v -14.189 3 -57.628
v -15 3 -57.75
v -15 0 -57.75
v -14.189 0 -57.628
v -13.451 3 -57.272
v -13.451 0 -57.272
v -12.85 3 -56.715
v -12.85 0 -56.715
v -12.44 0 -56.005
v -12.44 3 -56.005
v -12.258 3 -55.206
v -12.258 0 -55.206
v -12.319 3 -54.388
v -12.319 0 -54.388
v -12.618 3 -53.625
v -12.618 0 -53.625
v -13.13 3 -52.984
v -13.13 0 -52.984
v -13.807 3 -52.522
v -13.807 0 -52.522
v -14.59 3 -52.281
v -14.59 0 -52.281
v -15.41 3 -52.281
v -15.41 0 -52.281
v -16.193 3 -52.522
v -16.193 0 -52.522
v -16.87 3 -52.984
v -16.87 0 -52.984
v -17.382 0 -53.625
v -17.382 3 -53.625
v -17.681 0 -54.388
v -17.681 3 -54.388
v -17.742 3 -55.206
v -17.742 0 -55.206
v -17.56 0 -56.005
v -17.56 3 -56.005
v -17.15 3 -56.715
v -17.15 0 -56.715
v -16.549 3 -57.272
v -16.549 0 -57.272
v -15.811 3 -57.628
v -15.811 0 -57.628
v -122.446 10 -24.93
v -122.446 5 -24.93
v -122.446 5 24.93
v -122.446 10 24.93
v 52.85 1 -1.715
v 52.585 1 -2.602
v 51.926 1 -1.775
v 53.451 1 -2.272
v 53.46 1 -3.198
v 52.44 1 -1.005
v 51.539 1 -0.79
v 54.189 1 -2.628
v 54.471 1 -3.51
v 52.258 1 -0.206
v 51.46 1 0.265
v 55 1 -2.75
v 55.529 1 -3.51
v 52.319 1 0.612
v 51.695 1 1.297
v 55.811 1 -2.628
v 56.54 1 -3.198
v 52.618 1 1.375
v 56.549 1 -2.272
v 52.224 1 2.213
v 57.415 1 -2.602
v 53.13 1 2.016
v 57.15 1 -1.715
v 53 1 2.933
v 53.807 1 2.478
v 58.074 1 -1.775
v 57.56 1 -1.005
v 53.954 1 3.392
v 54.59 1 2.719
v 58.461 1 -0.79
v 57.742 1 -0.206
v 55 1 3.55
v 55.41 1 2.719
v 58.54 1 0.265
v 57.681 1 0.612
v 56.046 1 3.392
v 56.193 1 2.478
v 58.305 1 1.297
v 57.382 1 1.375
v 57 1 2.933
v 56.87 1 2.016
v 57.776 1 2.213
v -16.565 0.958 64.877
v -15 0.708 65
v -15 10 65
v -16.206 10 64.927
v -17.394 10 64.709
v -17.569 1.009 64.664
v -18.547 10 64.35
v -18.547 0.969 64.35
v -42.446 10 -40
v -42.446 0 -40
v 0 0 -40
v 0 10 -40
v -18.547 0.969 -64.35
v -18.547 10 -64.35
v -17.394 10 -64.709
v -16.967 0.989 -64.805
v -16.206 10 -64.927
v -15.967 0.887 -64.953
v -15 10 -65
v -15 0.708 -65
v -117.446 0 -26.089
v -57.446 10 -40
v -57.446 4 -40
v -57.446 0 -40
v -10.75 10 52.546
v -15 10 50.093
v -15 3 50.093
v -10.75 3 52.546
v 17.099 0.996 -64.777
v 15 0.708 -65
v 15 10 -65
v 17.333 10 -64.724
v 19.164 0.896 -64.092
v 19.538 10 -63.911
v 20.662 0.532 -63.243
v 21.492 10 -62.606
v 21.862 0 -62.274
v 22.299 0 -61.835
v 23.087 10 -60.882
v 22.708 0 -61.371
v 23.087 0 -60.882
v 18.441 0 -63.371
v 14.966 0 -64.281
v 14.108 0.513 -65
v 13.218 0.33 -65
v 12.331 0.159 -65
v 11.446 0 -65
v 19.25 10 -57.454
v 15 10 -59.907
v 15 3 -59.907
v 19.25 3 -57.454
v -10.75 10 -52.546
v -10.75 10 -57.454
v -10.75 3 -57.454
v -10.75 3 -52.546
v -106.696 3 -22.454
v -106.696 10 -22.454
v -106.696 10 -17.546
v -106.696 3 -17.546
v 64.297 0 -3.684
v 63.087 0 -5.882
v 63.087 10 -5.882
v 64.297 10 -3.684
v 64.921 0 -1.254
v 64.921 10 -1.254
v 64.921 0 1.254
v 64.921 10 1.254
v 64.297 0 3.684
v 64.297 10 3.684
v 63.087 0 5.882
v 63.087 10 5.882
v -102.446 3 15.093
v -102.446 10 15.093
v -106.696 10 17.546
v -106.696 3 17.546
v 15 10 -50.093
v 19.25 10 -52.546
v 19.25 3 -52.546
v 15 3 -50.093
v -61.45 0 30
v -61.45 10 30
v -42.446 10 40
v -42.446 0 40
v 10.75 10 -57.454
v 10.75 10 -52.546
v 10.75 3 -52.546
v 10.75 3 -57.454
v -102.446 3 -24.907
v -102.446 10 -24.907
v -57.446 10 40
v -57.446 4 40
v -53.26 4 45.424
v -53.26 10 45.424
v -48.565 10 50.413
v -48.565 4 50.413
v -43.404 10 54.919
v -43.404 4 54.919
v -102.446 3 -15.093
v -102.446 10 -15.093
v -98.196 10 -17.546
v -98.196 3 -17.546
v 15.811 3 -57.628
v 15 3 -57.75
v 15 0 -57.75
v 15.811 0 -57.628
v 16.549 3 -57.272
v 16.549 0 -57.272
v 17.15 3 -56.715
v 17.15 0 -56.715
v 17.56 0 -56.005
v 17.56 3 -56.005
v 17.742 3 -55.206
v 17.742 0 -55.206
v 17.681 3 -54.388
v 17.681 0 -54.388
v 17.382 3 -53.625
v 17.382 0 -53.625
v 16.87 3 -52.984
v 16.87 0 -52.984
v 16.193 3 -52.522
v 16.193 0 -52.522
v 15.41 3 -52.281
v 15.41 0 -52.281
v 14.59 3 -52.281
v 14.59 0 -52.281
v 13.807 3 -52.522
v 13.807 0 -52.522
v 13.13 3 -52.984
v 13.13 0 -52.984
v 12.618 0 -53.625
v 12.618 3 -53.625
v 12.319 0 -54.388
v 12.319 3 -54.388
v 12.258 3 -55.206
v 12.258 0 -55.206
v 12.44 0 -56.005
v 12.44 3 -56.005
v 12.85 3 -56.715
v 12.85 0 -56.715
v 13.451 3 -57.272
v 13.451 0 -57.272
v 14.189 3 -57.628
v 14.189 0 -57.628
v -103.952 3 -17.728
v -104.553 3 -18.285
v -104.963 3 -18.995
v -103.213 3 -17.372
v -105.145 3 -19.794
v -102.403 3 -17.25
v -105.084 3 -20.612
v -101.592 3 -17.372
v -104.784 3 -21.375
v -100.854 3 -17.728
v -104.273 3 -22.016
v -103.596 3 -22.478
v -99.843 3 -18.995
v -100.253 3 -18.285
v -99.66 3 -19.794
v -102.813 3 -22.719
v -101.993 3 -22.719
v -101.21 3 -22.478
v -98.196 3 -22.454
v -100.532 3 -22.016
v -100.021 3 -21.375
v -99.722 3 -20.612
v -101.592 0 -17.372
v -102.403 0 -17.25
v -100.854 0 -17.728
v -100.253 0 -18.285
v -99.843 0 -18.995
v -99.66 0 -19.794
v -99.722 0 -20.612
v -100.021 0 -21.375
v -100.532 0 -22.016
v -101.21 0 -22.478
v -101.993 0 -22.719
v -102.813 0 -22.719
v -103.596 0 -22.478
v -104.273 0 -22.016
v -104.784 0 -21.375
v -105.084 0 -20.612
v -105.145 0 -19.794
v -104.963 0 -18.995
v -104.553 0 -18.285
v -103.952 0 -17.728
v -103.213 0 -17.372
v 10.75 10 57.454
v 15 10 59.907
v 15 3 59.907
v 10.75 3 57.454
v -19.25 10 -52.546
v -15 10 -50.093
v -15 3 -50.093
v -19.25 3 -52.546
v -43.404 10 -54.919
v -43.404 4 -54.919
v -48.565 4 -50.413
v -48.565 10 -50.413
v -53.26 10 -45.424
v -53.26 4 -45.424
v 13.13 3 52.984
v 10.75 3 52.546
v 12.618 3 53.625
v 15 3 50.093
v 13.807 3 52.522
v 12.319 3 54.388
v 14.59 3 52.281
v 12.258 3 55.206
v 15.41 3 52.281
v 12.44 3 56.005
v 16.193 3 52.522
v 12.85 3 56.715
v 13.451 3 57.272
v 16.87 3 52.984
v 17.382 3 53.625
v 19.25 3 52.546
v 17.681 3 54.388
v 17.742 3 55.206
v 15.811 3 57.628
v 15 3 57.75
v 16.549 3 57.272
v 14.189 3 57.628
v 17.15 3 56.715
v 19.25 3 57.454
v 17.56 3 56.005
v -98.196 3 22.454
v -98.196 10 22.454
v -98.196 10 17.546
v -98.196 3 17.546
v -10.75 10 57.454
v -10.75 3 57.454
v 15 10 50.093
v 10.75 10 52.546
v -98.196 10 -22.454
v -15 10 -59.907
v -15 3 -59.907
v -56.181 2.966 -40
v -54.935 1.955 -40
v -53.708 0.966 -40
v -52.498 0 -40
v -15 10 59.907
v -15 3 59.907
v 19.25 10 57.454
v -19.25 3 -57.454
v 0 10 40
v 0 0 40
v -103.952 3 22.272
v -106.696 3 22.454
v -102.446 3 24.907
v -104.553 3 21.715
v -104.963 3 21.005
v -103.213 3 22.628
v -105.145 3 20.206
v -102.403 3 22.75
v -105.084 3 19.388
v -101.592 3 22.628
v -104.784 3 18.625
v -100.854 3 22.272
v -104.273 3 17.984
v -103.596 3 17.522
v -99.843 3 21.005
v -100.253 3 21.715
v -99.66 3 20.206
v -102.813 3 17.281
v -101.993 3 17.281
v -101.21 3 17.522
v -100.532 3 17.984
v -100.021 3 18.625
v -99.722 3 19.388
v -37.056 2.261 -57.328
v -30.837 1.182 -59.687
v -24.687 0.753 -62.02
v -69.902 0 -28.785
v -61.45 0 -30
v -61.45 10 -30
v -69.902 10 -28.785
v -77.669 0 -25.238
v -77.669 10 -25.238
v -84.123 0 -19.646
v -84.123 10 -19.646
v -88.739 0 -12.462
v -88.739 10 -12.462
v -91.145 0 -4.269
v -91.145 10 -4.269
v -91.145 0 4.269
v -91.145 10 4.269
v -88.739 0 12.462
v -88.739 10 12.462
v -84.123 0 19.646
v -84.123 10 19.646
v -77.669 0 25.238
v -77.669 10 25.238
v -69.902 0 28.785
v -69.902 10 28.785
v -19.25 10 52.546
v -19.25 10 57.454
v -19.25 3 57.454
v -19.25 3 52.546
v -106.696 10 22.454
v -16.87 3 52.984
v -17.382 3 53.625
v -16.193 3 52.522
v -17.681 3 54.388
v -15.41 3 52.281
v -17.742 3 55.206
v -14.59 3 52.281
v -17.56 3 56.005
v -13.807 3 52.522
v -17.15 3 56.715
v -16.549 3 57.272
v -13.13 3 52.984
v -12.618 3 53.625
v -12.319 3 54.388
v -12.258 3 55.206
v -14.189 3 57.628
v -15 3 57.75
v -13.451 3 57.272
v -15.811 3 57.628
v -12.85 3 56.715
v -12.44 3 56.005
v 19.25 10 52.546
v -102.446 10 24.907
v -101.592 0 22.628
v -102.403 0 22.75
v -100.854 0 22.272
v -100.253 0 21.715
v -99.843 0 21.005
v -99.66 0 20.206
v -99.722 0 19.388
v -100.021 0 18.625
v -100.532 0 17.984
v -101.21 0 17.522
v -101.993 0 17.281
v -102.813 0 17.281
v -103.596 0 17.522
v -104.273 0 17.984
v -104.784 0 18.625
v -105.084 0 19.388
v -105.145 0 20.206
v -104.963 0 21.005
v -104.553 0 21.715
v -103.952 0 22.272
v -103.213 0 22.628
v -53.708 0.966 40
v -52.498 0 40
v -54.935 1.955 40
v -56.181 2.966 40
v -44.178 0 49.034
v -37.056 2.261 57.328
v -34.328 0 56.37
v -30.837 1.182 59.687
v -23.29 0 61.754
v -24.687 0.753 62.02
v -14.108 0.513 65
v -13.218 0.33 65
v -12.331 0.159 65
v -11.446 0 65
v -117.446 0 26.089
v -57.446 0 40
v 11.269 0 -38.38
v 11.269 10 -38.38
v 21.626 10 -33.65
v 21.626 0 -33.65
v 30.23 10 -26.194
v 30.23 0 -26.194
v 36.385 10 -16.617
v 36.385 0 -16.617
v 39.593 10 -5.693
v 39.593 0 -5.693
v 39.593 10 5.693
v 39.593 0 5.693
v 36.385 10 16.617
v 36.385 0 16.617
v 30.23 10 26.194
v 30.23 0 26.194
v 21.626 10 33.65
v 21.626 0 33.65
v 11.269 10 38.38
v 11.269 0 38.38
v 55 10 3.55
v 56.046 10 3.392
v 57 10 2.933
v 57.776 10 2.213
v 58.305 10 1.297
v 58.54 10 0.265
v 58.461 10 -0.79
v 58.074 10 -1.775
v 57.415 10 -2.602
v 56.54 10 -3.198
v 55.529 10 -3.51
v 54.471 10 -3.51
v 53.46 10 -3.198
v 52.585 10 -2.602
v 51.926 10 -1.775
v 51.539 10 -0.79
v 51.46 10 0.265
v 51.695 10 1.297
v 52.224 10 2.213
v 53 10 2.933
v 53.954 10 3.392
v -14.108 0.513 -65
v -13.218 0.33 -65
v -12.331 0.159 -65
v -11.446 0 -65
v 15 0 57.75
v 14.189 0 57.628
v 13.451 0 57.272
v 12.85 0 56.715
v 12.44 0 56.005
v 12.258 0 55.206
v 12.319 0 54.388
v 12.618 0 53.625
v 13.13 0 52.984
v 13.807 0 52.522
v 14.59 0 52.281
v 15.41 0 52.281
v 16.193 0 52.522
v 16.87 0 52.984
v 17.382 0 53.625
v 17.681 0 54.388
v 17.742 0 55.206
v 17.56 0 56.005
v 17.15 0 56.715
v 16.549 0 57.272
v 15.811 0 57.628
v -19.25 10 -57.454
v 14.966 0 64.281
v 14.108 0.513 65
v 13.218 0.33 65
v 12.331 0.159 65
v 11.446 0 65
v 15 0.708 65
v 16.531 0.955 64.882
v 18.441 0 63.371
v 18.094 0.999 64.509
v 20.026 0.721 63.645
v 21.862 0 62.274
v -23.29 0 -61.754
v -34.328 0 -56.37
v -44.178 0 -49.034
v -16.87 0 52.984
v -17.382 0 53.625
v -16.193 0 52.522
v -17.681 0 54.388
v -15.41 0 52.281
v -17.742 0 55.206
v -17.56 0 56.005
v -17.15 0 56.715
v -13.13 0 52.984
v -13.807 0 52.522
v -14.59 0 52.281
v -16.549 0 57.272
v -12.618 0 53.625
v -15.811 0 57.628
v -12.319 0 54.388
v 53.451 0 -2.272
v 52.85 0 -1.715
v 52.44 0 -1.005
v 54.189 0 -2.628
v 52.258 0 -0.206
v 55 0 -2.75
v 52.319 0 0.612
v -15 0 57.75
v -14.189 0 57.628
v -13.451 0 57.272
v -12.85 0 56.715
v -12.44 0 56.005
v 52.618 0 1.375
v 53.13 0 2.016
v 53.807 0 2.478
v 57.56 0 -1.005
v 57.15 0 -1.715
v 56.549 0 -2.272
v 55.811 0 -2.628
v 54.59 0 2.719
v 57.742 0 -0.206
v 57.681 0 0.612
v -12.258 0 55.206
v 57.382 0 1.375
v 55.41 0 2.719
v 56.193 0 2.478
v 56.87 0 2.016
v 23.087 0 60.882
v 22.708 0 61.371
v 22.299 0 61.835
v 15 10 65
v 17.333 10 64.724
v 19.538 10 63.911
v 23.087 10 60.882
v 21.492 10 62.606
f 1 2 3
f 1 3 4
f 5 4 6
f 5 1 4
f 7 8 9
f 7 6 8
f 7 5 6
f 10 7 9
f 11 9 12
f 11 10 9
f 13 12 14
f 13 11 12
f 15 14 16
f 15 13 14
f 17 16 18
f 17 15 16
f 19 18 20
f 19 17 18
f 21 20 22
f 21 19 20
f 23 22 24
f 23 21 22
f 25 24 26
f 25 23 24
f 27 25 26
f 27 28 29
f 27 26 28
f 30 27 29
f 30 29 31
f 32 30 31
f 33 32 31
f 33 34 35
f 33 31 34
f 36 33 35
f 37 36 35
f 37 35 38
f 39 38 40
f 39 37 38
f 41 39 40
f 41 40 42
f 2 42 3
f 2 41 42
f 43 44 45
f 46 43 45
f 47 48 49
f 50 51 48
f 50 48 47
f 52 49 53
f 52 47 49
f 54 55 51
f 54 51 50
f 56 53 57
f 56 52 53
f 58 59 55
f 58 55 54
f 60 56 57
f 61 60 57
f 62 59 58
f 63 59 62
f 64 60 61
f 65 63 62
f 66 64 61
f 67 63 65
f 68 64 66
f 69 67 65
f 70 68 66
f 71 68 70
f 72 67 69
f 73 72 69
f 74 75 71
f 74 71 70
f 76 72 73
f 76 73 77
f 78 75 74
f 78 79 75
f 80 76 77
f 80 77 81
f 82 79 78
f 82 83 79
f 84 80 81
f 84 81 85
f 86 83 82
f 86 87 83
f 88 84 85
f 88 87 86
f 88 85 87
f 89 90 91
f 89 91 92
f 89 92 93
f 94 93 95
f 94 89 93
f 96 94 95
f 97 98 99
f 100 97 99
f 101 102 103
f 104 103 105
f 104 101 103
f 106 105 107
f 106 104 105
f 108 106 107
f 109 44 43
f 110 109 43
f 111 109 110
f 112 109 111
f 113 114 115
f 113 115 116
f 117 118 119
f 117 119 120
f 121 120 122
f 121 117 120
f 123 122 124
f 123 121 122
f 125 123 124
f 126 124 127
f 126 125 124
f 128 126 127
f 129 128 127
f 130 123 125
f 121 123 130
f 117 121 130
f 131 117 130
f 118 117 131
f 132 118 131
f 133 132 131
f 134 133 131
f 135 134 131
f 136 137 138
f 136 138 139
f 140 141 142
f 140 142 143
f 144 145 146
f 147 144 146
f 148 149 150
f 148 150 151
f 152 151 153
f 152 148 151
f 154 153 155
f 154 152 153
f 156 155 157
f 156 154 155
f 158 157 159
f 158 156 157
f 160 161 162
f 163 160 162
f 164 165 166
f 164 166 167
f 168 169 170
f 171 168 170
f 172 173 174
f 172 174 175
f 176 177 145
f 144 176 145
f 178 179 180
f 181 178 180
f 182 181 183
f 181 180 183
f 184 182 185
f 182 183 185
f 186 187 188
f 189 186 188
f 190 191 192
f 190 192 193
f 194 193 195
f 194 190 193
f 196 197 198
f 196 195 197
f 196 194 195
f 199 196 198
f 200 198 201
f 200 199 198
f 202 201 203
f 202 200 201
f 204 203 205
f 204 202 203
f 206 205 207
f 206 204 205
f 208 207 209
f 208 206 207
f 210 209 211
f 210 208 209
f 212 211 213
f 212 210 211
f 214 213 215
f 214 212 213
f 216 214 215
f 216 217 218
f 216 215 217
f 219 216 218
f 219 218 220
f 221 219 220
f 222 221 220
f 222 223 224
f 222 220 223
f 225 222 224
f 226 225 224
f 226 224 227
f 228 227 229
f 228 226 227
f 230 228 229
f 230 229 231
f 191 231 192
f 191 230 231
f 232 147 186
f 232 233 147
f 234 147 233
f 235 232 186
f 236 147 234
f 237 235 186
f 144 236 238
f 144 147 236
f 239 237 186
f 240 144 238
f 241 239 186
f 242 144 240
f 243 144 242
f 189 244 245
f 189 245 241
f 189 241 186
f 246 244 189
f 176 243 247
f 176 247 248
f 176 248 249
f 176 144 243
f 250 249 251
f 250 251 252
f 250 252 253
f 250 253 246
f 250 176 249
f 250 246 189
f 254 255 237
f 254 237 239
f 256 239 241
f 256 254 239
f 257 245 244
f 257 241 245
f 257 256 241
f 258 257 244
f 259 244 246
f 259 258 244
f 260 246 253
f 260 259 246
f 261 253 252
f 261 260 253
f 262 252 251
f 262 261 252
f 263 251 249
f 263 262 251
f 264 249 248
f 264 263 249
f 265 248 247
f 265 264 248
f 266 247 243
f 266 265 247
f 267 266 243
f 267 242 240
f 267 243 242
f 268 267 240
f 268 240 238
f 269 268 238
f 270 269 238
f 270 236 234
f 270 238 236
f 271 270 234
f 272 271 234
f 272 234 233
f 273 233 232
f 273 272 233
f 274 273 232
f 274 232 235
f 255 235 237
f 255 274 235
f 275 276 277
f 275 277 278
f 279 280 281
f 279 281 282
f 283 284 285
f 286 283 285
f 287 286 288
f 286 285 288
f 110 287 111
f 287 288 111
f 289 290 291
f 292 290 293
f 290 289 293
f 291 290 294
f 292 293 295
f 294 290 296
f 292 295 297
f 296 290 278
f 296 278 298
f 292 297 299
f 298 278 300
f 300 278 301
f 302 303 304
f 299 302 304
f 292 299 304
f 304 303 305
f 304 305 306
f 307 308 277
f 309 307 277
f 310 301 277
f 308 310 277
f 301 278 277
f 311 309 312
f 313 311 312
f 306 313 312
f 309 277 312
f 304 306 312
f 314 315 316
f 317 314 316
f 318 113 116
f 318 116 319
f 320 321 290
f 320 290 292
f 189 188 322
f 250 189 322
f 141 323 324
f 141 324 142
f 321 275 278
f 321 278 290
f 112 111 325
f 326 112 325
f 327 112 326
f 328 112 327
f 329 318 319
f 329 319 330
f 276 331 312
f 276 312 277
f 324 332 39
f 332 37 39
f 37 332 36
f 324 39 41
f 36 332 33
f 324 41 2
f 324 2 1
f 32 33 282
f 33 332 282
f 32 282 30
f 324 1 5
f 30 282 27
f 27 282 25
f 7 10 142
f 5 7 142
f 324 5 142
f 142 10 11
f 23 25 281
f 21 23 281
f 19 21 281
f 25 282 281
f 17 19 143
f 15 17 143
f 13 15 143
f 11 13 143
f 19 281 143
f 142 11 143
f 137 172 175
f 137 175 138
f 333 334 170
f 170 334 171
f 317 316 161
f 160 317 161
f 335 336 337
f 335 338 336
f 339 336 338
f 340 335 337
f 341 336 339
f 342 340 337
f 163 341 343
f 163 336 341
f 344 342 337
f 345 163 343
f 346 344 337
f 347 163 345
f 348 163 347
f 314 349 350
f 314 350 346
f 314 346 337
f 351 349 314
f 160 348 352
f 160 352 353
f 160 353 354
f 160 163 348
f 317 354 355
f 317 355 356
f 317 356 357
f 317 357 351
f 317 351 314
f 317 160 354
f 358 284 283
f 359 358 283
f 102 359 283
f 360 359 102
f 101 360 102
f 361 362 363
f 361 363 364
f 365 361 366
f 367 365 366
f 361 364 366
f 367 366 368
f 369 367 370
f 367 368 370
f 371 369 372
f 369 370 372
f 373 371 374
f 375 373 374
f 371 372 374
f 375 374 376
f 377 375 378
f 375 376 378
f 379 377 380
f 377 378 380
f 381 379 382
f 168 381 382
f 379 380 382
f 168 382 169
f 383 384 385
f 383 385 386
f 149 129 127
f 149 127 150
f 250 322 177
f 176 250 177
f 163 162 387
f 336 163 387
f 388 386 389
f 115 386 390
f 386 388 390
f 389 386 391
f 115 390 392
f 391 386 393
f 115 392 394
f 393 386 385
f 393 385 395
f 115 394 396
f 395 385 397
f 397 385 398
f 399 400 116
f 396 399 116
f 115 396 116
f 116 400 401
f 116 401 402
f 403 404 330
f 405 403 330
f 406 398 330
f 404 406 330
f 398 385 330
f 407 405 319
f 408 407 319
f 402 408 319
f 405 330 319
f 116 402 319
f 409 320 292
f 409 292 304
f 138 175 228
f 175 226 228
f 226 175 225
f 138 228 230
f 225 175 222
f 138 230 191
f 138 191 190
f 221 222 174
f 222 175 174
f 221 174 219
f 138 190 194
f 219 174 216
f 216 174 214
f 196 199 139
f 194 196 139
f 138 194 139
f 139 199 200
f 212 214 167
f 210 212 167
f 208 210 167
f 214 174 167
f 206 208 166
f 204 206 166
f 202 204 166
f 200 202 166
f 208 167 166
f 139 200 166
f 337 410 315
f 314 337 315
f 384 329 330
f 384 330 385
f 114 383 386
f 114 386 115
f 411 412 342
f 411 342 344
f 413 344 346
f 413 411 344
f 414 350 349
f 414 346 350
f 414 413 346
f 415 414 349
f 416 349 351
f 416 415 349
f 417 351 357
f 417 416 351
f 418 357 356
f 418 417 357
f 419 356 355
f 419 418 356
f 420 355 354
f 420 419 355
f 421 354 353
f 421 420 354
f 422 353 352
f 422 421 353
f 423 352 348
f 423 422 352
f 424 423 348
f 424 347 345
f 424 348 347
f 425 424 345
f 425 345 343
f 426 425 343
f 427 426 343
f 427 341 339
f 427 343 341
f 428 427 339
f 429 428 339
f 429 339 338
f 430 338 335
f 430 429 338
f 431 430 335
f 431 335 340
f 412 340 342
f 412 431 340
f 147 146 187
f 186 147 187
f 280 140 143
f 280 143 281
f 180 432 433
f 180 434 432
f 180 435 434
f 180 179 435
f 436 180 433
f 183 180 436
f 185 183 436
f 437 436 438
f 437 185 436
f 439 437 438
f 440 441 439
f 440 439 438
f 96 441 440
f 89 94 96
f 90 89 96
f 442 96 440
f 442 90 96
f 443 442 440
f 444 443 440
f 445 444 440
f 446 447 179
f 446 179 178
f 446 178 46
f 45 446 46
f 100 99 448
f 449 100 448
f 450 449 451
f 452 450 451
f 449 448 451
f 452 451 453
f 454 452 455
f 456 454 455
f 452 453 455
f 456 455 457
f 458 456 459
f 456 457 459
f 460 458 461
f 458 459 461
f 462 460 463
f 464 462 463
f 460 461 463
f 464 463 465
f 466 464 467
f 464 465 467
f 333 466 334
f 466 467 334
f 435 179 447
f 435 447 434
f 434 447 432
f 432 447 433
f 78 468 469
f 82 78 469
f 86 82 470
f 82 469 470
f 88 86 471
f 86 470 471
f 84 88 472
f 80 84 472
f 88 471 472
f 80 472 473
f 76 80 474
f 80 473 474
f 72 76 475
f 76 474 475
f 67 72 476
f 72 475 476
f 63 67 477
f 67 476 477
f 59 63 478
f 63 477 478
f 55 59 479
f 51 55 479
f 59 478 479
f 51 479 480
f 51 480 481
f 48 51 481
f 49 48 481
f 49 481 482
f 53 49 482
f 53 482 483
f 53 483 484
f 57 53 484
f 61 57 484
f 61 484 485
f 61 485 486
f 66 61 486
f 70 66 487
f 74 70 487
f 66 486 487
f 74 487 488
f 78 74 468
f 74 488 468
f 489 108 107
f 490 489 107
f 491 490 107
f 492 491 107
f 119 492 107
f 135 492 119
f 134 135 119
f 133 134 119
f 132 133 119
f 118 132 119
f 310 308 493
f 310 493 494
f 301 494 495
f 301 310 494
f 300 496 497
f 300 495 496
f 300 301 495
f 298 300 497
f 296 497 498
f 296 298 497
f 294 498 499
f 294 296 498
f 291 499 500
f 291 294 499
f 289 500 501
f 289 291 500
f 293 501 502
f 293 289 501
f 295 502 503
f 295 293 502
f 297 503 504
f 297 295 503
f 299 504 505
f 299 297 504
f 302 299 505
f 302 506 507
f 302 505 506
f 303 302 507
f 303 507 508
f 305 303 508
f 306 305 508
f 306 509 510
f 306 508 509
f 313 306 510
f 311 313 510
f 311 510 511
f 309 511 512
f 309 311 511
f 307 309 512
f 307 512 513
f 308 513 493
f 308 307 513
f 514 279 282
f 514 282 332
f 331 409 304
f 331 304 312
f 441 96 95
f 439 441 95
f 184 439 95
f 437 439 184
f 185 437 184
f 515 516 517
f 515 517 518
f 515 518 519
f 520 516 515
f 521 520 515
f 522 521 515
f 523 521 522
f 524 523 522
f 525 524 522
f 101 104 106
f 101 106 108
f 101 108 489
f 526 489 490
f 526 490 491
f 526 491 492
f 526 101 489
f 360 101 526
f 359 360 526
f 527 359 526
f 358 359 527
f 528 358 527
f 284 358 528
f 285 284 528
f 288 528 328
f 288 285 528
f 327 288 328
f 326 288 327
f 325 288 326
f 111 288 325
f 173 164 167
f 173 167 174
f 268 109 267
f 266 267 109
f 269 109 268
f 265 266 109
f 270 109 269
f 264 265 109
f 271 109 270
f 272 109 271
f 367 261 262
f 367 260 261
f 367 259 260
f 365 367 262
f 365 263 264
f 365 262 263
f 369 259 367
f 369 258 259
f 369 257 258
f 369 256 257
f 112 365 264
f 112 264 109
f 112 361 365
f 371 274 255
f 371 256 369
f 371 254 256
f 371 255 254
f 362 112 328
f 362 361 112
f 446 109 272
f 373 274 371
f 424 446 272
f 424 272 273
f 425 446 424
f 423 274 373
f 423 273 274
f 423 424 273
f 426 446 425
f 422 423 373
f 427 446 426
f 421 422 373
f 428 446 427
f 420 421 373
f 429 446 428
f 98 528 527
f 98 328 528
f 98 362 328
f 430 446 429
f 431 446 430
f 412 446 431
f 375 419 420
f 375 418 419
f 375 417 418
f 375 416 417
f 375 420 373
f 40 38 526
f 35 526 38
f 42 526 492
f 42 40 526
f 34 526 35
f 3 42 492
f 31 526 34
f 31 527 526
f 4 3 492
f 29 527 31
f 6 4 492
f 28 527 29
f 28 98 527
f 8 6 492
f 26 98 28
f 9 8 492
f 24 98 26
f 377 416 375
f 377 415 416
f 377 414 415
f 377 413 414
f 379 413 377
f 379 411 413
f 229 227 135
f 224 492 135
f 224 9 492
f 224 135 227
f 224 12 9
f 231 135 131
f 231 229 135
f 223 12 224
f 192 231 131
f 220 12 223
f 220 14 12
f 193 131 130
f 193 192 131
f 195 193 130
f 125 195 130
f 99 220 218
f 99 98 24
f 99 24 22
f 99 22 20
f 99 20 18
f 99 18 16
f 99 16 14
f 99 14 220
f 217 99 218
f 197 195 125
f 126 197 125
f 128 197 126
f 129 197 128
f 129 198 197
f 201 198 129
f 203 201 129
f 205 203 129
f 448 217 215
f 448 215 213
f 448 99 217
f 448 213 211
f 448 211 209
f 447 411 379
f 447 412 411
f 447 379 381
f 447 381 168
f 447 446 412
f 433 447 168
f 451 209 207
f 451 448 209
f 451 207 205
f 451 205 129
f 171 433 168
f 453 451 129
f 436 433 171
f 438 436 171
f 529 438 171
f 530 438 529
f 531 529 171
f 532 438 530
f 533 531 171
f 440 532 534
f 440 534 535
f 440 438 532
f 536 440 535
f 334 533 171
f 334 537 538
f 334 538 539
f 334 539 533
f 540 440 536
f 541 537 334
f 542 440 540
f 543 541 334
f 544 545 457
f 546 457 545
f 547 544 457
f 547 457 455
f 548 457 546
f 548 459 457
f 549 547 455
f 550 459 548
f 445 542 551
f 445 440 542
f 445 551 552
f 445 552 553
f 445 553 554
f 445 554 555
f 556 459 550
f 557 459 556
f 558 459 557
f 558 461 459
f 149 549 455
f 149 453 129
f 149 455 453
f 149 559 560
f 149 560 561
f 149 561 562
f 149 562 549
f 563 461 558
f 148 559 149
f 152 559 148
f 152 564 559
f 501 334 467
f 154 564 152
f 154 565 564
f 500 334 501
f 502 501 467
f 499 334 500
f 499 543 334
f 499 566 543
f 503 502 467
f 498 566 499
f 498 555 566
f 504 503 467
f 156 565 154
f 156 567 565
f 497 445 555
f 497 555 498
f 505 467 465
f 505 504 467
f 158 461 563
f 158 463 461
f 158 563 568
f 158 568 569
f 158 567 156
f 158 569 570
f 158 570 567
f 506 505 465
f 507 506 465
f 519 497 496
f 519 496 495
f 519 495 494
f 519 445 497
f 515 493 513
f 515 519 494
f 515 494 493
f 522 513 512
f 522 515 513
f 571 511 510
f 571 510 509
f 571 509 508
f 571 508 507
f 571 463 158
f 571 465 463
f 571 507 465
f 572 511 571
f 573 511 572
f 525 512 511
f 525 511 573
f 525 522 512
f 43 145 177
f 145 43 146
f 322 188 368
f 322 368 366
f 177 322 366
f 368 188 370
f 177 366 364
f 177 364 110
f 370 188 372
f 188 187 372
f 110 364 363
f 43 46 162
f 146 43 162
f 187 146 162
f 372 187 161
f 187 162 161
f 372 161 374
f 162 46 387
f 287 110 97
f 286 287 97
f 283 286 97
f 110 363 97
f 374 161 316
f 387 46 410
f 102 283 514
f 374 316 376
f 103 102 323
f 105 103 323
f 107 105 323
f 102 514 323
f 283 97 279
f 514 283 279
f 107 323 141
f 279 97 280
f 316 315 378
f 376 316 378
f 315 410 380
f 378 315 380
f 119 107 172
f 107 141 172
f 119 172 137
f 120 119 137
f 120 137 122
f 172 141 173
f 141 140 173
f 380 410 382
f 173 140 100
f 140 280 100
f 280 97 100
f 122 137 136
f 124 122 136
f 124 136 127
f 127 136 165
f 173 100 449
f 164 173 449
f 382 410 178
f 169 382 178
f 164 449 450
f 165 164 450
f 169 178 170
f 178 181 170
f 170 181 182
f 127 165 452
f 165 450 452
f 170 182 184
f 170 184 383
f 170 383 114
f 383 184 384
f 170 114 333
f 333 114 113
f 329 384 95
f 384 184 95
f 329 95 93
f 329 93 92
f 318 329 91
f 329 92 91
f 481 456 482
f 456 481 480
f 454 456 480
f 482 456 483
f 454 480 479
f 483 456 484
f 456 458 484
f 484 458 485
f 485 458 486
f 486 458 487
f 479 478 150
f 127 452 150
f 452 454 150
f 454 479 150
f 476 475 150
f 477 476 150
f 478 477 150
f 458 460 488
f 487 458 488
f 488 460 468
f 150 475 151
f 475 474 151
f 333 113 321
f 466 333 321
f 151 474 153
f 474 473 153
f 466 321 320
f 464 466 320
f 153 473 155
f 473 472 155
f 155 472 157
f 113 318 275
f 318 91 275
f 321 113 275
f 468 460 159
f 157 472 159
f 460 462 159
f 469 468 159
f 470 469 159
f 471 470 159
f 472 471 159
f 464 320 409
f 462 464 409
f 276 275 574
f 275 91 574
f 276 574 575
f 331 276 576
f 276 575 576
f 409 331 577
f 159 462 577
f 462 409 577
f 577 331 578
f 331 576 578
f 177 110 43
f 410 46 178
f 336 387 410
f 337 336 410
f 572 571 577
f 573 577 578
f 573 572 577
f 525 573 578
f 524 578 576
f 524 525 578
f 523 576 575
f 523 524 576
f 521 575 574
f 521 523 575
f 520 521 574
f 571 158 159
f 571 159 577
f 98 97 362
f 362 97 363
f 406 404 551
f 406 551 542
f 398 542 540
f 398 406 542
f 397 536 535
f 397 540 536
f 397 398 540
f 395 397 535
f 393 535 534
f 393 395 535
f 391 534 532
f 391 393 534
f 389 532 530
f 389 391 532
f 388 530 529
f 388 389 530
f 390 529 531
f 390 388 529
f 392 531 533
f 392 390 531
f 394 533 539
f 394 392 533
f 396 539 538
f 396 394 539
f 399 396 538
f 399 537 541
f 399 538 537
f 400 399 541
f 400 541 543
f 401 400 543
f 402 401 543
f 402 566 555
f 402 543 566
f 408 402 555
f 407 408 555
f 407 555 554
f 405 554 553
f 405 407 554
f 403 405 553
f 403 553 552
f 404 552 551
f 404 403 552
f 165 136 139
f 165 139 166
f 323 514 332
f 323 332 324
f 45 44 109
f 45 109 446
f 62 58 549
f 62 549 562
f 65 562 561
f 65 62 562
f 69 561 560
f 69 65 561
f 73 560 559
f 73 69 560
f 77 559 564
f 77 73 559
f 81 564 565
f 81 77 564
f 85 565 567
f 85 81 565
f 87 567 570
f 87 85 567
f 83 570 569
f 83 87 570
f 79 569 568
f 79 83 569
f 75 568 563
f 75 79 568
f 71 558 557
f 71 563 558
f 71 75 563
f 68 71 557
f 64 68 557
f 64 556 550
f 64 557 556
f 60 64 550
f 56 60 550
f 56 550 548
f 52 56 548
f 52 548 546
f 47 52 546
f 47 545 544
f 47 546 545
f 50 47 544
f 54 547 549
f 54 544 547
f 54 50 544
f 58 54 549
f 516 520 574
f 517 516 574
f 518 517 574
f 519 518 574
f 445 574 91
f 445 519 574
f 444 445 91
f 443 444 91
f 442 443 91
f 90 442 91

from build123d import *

# Parameters (mm, degrees)
SKETCH1_R                = 70
BOSS_EXTRUDE1_DEPTH      = 10
CUT_EXTRUDE1_DEPTH       = 100.498743711
CUT_EXTRUDE1_DEPTH_BACK  = 100.498743711
CUT_EXTRUDE2_DEPTH       = 100.498743711
CUT_EXTRUDE2_DEPTH_BACK  = 100.498743711
SKETCH3_R                = 2.75
CUT_EXTRUDE3_START       = -10
CUT_EXTRUDE3_DEPTH       = 7
SKETCH5_W                = 80
SKETCH5_H                = 80
BOSS_EXTRUDE2_DEPTH      = 10
CHAMFER1_SIZE            = 4
CUT_EXTRUDE4_DEPTH       = 7
CUT_EXTRUDE5_DEPTH       = 142.215903639
CUT_EXTRUDE5_DEPTH_BACK  = 142.215903639
SKETCH7_R                = 2.75
CUT_EXTRUDE6_DEPTH       = 142.396362897
CUT_EXTRUDE6_DEPTH_BACK  = 142.396362897
CUT_EXTRUDE7_DEPTH       = 142.396362897
CUT_EXTRUDE7_DEPTH_BACK  = 142.396362897
CHAMFER3_SIZE            = 5
CUT_EXTRUDE8_DEPTH       = 142.396362897
CUT_EXTRUDE8_DEPTH_BACK  = 142.396362897
SKETCH10_R               = 2.75
SKETCH11_R               = 3.55
CUT_EXTRUDE9_DEPTH       = 9
CUT_EXTRUDE11_DEPTH      = 142.396362897
CUT_EXTRUDE11_DEPTH_BACK = 142.396362897
SKETCH12_OUTSIDE_W       = 242.084
SKETCH12_OUTSIDE_H       = 189.638


with BuildPart() as part:
    # Sketch1 → Boss-Extrude1 (new body)
    with BuildSketch(Plane(origin=(0, 0, 0), x_dir=(1, 0, 0), z_dir=(0, 1, 0))):
        with Locations(Location((0, 0, 0), (0, 0, 270))):
            Circle(SKETCH1_R)
    extrude(amount=BOSS_EXTRUDE1_DEPTH)

    # Sketch2 → Cut-Extrude1 (cut, two sides: drawn at the far end of the back side and taken through both)
    with BuildSketch(Plane(origin=(0, 10, 0), x_dir=(1, 0, 0), z_dir=(0, 1, 0)).offset(-CUT_EXTRUDE1_DEPTH_BACK)):
        with BuildLine():
            Line((0, -40), (-130.143973447, -40))
            ThreePointArc((-130.143973447, -40), (-170.143973447, 0), (-130.143973447, 40))
            Line((-130.143973447, 40), (0, 40))
            ThreePointArc((0, 40), (40, 0), (0, -40))
        make_face()
    extrude(amount=CUT_EXTRUDE1_DEPTH + CUT_EXTRUDE1_DEPTH_BACK, mode=Mode.SUBTRACT)

    # Sketch3 → Cut-Extrude2 (cut, two sides: drawn at the far end of the back side and taken through both)
    with BuildSketch(Plane(origin=(0, 0, 0), x_dir=(-1, 0, 0), z_dir=(0, -1, 0)).offset(-CUT_EXTRUDE2_DEPTH_BACK)):
        with Locations(Location((15, 55, 0), (0, 0, 90))):
            Circle(SKETCH3_R)
        with Locations(Location((-15, 55, 0), (0, 0, 90))):
            Circle(SKETCH3_R)
        with Locations(Location((-15, -55, 0), (0, 0, 270))):
            Circle(SKETCH3_R)
        with Locations(Location((15, -55, 0), (0, 0, 270))):
            Circle(SKETCH3_R)
    extrude(amount=CUT_EXTRUDE2_DEPTH + CUT_EXTRUDE2_DEPTH_BACK, mode=Mode.SUBTRACT)

    # Sketch4 → Cut-Extrude3 (cut)
    with BuildSketch(Plane.XZ.offset(CUT_EXTRUDE3_START)):
        Polygon((-15, -50.092522712), (-19.25, -52.546261356), (-19.25, -57.453738644), (-15, -59.907477288), (-10.75, -57.453738644), (-10.75, -52.546261356), align=None)
        Polygon((15, -50.092522712), (10.75, -52.546261356), (10.75, -57.453738644), (15, -59.907477288), (19.25, -57.453738644), (19.25, -52.546261356), align=None)
        Polygon((-15, 59.907477288), (-19.25, 57.453738644), (-19.25, 52.546261356), (-15, 50.092522712), (-10.75, 52.546261356), (-10.75, 57.453738644), align=None)
        Polygon((15, 59.907477288), (10.75, 57.453738644), (10.75, 52.546261356), (15, 50.092522712), (19.25, 52.546261356), (19.25, 57.453738644), align=None)
    extrude(amount=CUT_EXTRUDE3_DEPTH, mode=Mode.SUBTRACT)

    # Sketch5 → Boss-Extrude2 (add)
    with BuildSketch(Plane.XZ):
        with Locations((-82.445626465, 0)):
            Rectangle(SKETCH5_W, SKETCH5_H)
    extrude(amount=-BOSS_EXTRUDE2_DEPTH)

    # Chamfer1
    chamfer1_edges = [part.edges().sort_by_distance(p)[0] for p in [
        (70, 0, 0),
    ]]
    chamfer(chamfer1_edges, length=CHAMFER1_SIZE)

    # Sketch6 → Cut-Extrude4 (cut)
    with BuildSketch(Plane(origin=(0, 10, 0), x_dir=(1, 0, 0), z_dir=(0, 1, 0))):
        Polygon((-102.445626465, 24.907477288), (-106.695626465, 22.453738644), (-106.695626465, 17.546261356), (-102.445626465, 15.092522712), (-98.195626465, 17.546261356), (-98.195626465, 22.453738644), align=None)
        Polygon((-102.445626465, -15.092522712), (-106.695626465, -17.546261356), (-106.695626465, -22.453738644), (-102.445626465, -24.907477288), (-98.195626465, -22.453738644), (-98.195626465, -17.546261356), align=None)
    extrude(amount=-CUT_EXTRUDE4_DEPTH, mode=Mode.SUBTRACT)

    # Sketch7 → Cut-Extrude5 (cut, two sides: drawn at the far end of the back side and taken through both)
    with BuildSketch(Plane(origin=(0, 3, 0), x_dir=(1, 0, 0), z_dir=(0, 1, 0)).offset(-CUT_EXTRUDE5_DEPTH_BACK)):
        with Locations(Location((-102.402760328, 20, 0), (0, 0, 270))):
            Circle(SKETCH7_R)
        with Locations(Location((-102.402760328, -20, 0), (0, 0, 270))):
            Circle(SKETCH7_R)
    extrude(amount=CUT_EXTRUDE5_DEPTH + CUT_EXTRUDE5_DEPTH_BACK, mode=Mode.SUBTRACT)

    # Sketch8 → Cut-Extrude6 (cut, two sides: drawn at the far end of the back side and taken through both)
    with BuildSketch(Plane(origin=(0, 10, 0), x_dir=(1, 0, 0), z_dir=(0, 1, 0)).offset(-CUT_EXTRUDE6_DEPTH_BACK)):
        Polygon((-57.445626465, -40), (-132.928087077, -22.5), (-132.928087077, 22.5), (-57.445626465, 40), (-157.567703317, 66.574038668), (-157.567703317, -80.170037604), align=None)
    extrude(amount=CUT_EXTRUDE6_DEPTH + CUT_EXTRUDE6_DEPTH_BACK, mode=Mode.SUBTRACT)

    # Sketch9 → Cut-Extrude7 (cut, two sides: drawn at the far end of the back side and taken through both)
    with BuildSketch(Plane.XZ.offset(-CUT_EXTRUDE7_DEPTH_BACK)):
        with BuildLine():
            Line((-61.450221561, 30), (-42.445626465, 40))
            Line((-42.445626465, 40), (0, 30))
            ThreePointArc((0, 30), (30, 0), (0, -30))
            Line((0, -30), (-42.445626465, -40))
            Line((-42.445626465, -40), (-61.450221561, -30))
            ThreePointArc((-61.450221561, -30), (-91.450221561, 0), (-61.450221561, 30))
        make_face()
    extrude(amount=CUT_EXTRUDE7_DEPTH + CUT_EXTRUDE7_DEPTH_BACK, mode=Mode.SUBTRACT)

    # Chamfer3
    chamfer3_edges = [part.edges().sort_by_distance(p)[0] for p in [
        (-122.445626465, 0, 0),
    ]]
    chamfer(chamfer3_edges, length=CHAMFER3_SIZE)

    # Sketch10 → Cut-Extrude8 (cut, two sides: drawn at the far end of the back side and taken through both)
    with BuildSketch(Plane.XZ.offset(-CUT_EXTRUDE8_DEPTH_BACK)):
        with Locations(Location((55, 0, 0), (0, 0, 270))):
            Circle(SKETCH10_R)
    extrude(amount=CUT_EXTRUDE8_DEPTH + CUT_EXTRUDE8_DEPTH_BACK, mode=Mode.SUBTRACT)

    # Sketch11 → Cut-Extrude9 (cut)
    with BuildSketch(Plane(origin=(0, 10, 0), x_dir=(1, 0, 0), z_dir=(0, 1, 0))):
        with Locations(Location((55, 0, 0), (0, 0, 270))):
            Circle(SKETCH11_R)
    extrude(amount=-CUT_EXTRUDE9_DEPTH, mode=Mode.SUBTRACT)

    # Sketch12 outside → Cut-Extrude11 (cut, two sides: drawn at the far end of the back side and taken through both)
    with BuildSketch(Plane(origin=(0, 10, 0), x_dir=(1, 0, 0), z_dir=(0, 1, 0)).offset(-CUT_EXTRUDE11_DEPTH_BACK)):
        with Locations((-26.223, 0)):
            Rectangle(SKETCH12_OUTSIDE_W, SKETCH12_OUTSIDE_H)
        with BuildLine():
            Line((-122.445626465, 24.93027399), (-18.547305729, 64.349685667))
            ThreePointArc((-18.547305729, 64.349685667), (-16.803211487, 64.836077894), (-15, 65))
            Line((-15, 65), (15, 65))
            ThreePointArc((15, 65), (19.537776451, 63.91114947), (23.087360843, 60.881716977))
            Line((23.087360843, 60.881716977), (63.087360843, 5.881716977))
            ThreePointArc((63.087360843, 5.881716977), (65, 0), (63.087360843, -5.881716977))
            Line((63.087360843, -5.881716977), (23.087360843, -60.881716977))
            ThreePointArc((23.087360843, -60.881716977), (19.537776451, -63.91114947), (15, -65))
            Line((15, -65), (-15, -65))
            ThreePointArc((-15, -65), (-16.803211487, -64.836077894), (-18.547305729, -64.349685667))
            Line((-18.547305729, -64.349685667), (-122.445626465, -24.93027399))
            Line((-122.445626465, -24.93027399), (-122.445626465, 24.93027399))
        make_face(mode=Mode.SUBTRACT)
    extrude(amount=CUT_EXTRUDE11_DEPTH + CUT_EXTRUDE11_DEPTH_BACK, mode=Mode.SUBTRACT)


solid = part.part
